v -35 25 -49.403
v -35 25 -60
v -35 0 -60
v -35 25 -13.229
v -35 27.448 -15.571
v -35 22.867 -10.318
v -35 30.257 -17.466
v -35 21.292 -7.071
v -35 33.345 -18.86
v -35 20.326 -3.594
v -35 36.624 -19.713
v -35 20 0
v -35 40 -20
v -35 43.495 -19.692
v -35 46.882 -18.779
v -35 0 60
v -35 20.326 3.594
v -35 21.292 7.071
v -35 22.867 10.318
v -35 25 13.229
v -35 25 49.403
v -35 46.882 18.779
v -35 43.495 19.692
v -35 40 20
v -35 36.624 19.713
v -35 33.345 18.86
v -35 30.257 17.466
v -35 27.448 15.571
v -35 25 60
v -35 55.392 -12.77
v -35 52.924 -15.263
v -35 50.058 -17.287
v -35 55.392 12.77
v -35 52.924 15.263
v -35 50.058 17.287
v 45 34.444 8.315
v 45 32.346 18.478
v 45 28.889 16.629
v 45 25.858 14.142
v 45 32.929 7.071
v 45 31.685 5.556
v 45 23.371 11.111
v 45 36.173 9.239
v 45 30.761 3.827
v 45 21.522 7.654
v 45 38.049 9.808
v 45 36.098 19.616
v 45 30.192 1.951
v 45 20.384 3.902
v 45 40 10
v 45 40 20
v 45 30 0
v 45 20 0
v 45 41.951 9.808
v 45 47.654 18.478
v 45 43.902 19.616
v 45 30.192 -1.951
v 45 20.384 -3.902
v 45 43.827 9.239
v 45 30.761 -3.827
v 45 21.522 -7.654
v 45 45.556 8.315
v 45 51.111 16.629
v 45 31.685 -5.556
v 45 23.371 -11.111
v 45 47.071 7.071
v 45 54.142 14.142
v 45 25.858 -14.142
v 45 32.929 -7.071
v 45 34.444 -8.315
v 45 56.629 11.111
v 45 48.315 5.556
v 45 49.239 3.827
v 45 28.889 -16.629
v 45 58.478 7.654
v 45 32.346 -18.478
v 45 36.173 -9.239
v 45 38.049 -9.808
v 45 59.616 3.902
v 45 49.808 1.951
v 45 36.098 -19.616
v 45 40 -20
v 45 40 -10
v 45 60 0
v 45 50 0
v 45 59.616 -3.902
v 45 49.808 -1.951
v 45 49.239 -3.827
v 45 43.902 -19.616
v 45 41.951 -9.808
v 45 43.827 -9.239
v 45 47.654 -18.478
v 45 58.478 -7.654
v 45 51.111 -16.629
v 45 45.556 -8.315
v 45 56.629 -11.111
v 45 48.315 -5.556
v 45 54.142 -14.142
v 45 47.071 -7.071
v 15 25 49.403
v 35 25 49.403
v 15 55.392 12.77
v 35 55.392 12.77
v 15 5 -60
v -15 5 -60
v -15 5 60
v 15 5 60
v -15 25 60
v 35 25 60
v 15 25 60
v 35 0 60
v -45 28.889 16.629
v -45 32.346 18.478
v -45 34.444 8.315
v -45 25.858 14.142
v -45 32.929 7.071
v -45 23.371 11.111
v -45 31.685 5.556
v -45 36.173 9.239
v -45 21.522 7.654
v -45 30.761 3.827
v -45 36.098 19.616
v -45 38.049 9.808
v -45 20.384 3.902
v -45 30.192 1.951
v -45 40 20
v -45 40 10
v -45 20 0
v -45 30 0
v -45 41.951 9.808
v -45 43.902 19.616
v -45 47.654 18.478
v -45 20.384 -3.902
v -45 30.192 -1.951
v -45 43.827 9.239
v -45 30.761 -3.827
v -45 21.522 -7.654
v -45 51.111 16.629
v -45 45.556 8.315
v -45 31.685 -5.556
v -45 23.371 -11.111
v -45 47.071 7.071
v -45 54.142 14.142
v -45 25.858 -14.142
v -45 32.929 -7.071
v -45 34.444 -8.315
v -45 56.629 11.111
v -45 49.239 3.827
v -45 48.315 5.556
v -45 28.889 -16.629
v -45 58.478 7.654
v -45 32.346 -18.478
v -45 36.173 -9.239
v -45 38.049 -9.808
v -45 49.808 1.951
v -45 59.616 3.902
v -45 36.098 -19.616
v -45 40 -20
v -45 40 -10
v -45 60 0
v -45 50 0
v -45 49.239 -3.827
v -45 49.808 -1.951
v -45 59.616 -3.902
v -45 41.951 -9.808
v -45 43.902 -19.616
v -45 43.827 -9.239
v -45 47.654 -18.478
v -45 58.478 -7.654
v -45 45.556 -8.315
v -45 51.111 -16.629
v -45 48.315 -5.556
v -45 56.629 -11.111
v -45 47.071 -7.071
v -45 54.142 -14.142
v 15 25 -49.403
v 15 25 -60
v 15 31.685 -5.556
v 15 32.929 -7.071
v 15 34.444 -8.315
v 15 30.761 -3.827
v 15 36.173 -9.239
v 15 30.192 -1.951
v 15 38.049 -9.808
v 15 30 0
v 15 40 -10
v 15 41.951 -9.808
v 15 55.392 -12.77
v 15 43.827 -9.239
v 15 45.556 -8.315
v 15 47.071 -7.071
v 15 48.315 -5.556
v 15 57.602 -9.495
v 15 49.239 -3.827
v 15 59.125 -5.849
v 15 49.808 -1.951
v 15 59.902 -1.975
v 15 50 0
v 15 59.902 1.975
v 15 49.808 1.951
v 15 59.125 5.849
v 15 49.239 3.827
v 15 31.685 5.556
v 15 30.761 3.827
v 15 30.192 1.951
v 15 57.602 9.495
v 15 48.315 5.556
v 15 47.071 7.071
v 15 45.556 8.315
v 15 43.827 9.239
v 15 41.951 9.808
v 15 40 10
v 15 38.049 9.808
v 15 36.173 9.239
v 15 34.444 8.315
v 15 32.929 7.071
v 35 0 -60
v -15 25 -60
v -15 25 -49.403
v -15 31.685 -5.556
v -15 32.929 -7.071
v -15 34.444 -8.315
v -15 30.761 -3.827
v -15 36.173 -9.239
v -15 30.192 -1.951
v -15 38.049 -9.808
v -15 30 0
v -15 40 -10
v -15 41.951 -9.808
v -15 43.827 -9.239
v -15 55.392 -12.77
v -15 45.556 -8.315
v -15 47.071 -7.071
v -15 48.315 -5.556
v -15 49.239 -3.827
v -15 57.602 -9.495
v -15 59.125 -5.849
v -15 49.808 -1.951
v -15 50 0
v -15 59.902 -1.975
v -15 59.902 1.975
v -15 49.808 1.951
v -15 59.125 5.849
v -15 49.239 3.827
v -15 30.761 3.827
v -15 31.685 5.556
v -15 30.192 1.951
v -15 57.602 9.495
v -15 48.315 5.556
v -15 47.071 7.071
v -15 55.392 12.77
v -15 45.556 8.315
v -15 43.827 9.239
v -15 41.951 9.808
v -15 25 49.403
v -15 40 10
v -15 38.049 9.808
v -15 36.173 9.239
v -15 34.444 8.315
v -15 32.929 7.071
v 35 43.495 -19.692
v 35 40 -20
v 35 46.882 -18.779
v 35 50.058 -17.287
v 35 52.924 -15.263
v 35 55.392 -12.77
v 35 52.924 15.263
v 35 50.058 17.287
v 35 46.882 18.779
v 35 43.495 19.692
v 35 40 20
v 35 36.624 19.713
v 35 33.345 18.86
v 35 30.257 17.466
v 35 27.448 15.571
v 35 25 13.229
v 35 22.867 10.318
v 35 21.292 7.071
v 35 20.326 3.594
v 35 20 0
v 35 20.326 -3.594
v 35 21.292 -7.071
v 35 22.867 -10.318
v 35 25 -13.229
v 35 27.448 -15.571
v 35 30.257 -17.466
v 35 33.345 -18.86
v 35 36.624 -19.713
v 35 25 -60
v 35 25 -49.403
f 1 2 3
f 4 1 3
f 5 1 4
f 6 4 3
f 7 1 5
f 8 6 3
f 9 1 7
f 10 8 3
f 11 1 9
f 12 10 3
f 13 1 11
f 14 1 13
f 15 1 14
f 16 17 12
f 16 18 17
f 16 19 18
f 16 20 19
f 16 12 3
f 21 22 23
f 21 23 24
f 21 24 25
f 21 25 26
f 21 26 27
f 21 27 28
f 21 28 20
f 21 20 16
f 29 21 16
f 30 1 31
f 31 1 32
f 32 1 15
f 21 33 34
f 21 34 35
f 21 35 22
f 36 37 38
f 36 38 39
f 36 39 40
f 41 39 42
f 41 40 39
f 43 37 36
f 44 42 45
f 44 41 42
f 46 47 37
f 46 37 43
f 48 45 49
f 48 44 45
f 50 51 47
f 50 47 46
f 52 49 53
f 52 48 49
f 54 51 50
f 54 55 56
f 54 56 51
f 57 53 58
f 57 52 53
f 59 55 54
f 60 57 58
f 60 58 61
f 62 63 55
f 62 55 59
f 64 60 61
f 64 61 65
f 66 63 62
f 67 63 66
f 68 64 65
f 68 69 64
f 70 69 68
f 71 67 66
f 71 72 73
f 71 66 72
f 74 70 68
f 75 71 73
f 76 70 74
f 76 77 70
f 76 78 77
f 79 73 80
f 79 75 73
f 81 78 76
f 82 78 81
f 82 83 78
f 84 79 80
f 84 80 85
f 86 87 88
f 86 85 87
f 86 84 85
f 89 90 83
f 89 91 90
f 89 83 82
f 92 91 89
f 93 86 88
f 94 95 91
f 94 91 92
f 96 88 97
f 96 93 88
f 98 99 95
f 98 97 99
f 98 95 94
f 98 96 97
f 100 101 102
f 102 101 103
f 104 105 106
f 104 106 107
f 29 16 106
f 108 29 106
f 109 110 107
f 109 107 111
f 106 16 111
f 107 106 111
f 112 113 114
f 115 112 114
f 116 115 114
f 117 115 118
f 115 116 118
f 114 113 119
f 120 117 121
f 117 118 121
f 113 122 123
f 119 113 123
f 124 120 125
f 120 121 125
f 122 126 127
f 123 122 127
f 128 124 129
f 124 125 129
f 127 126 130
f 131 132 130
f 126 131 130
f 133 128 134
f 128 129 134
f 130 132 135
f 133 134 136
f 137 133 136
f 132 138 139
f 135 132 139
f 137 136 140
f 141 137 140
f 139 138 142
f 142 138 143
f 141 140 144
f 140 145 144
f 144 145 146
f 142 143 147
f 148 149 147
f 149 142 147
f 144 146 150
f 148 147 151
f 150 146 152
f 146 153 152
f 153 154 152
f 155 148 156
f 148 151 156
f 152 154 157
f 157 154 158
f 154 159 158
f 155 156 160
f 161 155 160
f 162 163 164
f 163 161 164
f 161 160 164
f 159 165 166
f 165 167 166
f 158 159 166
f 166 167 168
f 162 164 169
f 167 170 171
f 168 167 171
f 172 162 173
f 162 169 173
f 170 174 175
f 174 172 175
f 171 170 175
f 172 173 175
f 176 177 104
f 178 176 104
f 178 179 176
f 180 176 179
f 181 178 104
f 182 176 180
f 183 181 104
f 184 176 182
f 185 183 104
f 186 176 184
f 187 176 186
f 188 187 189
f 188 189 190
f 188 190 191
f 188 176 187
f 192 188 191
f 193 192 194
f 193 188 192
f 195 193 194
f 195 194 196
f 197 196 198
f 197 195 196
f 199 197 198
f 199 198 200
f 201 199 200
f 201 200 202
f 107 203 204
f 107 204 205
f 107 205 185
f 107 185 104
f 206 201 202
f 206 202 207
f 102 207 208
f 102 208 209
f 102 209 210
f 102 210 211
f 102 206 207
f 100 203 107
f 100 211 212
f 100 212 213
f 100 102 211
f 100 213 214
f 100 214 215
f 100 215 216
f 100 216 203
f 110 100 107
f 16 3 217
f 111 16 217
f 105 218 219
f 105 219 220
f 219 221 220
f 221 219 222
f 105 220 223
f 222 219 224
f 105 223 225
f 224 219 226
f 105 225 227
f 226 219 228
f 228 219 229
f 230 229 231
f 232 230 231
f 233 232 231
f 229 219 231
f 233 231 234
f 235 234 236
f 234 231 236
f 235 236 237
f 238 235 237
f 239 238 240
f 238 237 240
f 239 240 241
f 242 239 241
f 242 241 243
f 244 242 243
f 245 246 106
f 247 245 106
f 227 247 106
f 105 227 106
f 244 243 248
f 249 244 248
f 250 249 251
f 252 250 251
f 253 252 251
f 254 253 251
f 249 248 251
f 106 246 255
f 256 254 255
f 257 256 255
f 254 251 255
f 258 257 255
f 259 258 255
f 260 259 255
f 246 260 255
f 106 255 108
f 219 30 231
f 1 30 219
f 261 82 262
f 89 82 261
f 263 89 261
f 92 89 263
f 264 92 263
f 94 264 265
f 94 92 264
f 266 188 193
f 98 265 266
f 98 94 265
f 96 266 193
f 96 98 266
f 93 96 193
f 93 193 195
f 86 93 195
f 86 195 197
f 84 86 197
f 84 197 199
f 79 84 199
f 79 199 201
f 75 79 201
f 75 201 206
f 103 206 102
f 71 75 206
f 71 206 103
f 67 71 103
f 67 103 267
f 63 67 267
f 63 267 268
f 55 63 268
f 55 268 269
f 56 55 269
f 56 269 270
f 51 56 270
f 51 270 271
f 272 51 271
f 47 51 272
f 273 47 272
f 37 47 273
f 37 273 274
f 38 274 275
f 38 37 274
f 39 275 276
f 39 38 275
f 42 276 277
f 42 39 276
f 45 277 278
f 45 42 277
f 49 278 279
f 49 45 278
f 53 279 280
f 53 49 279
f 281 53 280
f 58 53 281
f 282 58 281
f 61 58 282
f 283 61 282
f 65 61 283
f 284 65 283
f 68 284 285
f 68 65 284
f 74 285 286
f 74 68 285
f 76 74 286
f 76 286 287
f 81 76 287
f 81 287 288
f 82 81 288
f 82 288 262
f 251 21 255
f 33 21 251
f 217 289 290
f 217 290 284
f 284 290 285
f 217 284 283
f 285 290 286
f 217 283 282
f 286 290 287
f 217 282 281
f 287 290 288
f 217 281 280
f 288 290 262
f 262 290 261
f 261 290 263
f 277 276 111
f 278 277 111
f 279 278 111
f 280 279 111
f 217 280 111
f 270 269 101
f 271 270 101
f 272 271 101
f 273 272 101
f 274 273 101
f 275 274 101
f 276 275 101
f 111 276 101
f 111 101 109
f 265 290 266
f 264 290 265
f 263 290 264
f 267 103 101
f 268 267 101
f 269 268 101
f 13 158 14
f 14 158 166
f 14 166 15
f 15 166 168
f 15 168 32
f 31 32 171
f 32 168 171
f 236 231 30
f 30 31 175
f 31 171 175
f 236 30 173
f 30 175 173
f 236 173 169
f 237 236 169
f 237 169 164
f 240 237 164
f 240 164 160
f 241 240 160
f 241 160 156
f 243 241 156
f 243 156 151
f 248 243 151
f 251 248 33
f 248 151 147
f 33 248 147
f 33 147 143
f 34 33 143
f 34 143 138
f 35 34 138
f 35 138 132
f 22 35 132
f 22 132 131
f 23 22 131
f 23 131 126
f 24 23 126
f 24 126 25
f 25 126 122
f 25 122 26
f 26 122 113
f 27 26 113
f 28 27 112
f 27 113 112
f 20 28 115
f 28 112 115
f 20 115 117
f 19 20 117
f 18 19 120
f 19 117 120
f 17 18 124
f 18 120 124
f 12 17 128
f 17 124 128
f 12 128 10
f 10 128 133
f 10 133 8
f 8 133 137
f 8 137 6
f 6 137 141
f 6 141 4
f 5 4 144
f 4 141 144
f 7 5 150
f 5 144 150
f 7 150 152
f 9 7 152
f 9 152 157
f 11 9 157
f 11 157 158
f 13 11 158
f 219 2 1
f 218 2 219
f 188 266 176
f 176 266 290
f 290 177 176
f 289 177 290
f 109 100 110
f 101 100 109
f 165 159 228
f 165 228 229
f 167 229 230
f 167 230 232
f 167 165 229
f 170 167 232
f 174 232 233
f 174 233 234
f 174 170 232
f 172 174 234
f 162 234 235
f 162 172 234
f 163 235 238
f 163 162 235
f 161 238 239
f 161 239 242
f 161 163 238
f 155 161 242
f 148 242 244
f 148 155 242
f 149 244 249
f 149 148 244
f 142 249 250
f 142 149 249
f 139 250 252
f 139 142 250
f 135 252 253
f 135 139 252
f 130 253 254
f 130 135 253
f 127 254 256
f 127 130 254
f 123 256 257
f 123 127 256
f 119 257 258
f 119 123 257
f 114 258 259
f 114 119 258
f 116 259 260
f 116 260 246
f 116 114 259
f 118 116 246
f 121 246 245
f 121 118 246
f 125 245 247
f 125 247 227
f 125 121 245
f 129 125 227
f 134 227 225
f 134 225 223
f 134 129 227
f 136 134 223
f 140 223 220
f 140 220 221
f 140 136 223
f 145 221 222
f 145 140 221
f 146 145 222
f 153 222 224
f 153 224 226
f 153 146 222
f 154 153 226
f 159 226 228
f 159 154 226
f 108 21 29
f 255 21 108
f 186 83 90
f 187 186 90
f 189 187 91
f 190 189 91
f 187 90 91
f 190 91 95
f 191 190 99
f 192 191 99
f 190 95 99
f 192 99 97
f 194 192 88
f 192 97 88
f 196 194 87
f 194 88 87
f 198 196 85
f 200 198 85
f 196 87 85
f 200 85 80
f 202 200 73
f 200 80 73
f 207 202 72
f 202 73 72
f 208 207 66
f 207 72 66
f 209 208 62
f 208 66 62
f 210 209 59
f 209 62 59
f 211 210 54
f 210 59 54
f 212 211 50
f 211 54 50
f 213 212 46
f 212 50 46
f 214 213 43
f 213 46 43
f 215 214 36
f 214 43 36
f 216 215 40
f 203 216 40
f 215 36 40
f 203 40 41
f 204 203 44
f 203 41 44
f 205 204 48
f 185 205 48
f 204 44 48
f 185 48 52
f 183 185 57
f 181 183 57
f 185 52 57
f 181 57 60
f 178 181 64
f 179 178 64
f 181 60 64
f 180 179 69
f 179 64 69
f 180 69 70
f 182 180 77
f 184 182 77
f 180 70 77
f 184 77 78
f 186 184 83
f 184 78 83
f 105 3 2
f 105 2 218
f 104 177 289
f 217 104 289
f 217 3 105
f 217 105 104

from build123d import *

# Parameters (mm, degrees)
SKETCH1_W           = 70
SKETCH1_H           = 120
BOSS_EXTRUDE1_DEPTH = 25
SKETCH2_W           = 30
SKETCH2_H           = 120
CUT_EXTRUDE1_DEPTH  = 20
SKETCH4_R           = 20
SKETCH4_R_2         = 10
BOSS_EXTRUDE2_DEPTH = 30
BOSS_EXTRUDE3_DEPTH = 20


with BuildPart() as part:
    # Sketch1 → Boss-Extrude1 (new body)
    with BuildSketch(Plane(origin=(0, 0, 0), x_dir=(1, 0, 0), z_dir=(0, 1, 0))):
        Rectangle(SKETCH1_W, SKETCH1_H)
    extrude(amount=BOSS_EXTRUDE1_DEPTH)

    # Sketch2 → Cut-Extrude1 (cut)
    with BuildSketch(Plane(origin=(0, 25, 0), x_dir=(1, 0, 0), z_dir=(0, 1, 0))):
        Rectangle(SKETCH2_W, SKETCH2_H)
    extrude(amount=-CUT_EXTRUDE1_DEPTH, mode=Mode.SUBTRACT)

    # Sketch4 → Boss-Extrude2 (add)
    with BuildSketch(Plane(origin=(45, 0, 0), x_dir=(0, 0, -1), z_dir=(1, 0, 0))):
        with Locations((0, 40)):
            Circle(SKETCH4_R)
        with Locations((0, 40)):
            Circle(SKETCH4_R_2, mode=Mode.SUBTRACT)
    boss_extrude2 = extrude(amount=-BOSS_EXTRUDE2_DEPTH)

    # Mirror1: Boss-Extrude2 across plane
    add(boss_extrude2.mirror(Plane(origin=(0, 0, 0), x_dir=(0, 0, 1), z_dir=(1, 0, 0))))

    # Sketch5 → Boss-Extrude3 (add)
    with BuildSketch(Plane.ZY.offset(35)):
        with BuildLine():
            ThreePointArc((-13.228756555, 25), (-19.997722926, 40.301790929), (-12.770097474, 55.392355587))
            Line((-12.770097474, 55.392355587), (-49.403329543, 25))
            Line((-49.403329543, 25), (-13.228756555, 25))
        make_face()
        with BuildLine():
            Line((49.403329543, 25), (12.770097474, 55.392355587))
            ThreePointArc((12.770097474, 55.392355587), (18.10251294, 48.50288335), (20, 40))
            ThreePointArc((20, 40), (18.228756555, 31.771243445), (13.228756555, 25))
            Line((13.228756555, 25), (49.403329543, 25))
        make_face()
    boss_extrude3 = extrude(amount=-BOSS_EXTRUDE3_DEPTH)

    # Mirror2: Boss-Extrude3 across plane
    add(boss_extrude3.mirror(Plane(origin=(0, 0, 0), x_dir=(0, 0, 1), z_dir=(1, 0, 0))))


solid = part.part
